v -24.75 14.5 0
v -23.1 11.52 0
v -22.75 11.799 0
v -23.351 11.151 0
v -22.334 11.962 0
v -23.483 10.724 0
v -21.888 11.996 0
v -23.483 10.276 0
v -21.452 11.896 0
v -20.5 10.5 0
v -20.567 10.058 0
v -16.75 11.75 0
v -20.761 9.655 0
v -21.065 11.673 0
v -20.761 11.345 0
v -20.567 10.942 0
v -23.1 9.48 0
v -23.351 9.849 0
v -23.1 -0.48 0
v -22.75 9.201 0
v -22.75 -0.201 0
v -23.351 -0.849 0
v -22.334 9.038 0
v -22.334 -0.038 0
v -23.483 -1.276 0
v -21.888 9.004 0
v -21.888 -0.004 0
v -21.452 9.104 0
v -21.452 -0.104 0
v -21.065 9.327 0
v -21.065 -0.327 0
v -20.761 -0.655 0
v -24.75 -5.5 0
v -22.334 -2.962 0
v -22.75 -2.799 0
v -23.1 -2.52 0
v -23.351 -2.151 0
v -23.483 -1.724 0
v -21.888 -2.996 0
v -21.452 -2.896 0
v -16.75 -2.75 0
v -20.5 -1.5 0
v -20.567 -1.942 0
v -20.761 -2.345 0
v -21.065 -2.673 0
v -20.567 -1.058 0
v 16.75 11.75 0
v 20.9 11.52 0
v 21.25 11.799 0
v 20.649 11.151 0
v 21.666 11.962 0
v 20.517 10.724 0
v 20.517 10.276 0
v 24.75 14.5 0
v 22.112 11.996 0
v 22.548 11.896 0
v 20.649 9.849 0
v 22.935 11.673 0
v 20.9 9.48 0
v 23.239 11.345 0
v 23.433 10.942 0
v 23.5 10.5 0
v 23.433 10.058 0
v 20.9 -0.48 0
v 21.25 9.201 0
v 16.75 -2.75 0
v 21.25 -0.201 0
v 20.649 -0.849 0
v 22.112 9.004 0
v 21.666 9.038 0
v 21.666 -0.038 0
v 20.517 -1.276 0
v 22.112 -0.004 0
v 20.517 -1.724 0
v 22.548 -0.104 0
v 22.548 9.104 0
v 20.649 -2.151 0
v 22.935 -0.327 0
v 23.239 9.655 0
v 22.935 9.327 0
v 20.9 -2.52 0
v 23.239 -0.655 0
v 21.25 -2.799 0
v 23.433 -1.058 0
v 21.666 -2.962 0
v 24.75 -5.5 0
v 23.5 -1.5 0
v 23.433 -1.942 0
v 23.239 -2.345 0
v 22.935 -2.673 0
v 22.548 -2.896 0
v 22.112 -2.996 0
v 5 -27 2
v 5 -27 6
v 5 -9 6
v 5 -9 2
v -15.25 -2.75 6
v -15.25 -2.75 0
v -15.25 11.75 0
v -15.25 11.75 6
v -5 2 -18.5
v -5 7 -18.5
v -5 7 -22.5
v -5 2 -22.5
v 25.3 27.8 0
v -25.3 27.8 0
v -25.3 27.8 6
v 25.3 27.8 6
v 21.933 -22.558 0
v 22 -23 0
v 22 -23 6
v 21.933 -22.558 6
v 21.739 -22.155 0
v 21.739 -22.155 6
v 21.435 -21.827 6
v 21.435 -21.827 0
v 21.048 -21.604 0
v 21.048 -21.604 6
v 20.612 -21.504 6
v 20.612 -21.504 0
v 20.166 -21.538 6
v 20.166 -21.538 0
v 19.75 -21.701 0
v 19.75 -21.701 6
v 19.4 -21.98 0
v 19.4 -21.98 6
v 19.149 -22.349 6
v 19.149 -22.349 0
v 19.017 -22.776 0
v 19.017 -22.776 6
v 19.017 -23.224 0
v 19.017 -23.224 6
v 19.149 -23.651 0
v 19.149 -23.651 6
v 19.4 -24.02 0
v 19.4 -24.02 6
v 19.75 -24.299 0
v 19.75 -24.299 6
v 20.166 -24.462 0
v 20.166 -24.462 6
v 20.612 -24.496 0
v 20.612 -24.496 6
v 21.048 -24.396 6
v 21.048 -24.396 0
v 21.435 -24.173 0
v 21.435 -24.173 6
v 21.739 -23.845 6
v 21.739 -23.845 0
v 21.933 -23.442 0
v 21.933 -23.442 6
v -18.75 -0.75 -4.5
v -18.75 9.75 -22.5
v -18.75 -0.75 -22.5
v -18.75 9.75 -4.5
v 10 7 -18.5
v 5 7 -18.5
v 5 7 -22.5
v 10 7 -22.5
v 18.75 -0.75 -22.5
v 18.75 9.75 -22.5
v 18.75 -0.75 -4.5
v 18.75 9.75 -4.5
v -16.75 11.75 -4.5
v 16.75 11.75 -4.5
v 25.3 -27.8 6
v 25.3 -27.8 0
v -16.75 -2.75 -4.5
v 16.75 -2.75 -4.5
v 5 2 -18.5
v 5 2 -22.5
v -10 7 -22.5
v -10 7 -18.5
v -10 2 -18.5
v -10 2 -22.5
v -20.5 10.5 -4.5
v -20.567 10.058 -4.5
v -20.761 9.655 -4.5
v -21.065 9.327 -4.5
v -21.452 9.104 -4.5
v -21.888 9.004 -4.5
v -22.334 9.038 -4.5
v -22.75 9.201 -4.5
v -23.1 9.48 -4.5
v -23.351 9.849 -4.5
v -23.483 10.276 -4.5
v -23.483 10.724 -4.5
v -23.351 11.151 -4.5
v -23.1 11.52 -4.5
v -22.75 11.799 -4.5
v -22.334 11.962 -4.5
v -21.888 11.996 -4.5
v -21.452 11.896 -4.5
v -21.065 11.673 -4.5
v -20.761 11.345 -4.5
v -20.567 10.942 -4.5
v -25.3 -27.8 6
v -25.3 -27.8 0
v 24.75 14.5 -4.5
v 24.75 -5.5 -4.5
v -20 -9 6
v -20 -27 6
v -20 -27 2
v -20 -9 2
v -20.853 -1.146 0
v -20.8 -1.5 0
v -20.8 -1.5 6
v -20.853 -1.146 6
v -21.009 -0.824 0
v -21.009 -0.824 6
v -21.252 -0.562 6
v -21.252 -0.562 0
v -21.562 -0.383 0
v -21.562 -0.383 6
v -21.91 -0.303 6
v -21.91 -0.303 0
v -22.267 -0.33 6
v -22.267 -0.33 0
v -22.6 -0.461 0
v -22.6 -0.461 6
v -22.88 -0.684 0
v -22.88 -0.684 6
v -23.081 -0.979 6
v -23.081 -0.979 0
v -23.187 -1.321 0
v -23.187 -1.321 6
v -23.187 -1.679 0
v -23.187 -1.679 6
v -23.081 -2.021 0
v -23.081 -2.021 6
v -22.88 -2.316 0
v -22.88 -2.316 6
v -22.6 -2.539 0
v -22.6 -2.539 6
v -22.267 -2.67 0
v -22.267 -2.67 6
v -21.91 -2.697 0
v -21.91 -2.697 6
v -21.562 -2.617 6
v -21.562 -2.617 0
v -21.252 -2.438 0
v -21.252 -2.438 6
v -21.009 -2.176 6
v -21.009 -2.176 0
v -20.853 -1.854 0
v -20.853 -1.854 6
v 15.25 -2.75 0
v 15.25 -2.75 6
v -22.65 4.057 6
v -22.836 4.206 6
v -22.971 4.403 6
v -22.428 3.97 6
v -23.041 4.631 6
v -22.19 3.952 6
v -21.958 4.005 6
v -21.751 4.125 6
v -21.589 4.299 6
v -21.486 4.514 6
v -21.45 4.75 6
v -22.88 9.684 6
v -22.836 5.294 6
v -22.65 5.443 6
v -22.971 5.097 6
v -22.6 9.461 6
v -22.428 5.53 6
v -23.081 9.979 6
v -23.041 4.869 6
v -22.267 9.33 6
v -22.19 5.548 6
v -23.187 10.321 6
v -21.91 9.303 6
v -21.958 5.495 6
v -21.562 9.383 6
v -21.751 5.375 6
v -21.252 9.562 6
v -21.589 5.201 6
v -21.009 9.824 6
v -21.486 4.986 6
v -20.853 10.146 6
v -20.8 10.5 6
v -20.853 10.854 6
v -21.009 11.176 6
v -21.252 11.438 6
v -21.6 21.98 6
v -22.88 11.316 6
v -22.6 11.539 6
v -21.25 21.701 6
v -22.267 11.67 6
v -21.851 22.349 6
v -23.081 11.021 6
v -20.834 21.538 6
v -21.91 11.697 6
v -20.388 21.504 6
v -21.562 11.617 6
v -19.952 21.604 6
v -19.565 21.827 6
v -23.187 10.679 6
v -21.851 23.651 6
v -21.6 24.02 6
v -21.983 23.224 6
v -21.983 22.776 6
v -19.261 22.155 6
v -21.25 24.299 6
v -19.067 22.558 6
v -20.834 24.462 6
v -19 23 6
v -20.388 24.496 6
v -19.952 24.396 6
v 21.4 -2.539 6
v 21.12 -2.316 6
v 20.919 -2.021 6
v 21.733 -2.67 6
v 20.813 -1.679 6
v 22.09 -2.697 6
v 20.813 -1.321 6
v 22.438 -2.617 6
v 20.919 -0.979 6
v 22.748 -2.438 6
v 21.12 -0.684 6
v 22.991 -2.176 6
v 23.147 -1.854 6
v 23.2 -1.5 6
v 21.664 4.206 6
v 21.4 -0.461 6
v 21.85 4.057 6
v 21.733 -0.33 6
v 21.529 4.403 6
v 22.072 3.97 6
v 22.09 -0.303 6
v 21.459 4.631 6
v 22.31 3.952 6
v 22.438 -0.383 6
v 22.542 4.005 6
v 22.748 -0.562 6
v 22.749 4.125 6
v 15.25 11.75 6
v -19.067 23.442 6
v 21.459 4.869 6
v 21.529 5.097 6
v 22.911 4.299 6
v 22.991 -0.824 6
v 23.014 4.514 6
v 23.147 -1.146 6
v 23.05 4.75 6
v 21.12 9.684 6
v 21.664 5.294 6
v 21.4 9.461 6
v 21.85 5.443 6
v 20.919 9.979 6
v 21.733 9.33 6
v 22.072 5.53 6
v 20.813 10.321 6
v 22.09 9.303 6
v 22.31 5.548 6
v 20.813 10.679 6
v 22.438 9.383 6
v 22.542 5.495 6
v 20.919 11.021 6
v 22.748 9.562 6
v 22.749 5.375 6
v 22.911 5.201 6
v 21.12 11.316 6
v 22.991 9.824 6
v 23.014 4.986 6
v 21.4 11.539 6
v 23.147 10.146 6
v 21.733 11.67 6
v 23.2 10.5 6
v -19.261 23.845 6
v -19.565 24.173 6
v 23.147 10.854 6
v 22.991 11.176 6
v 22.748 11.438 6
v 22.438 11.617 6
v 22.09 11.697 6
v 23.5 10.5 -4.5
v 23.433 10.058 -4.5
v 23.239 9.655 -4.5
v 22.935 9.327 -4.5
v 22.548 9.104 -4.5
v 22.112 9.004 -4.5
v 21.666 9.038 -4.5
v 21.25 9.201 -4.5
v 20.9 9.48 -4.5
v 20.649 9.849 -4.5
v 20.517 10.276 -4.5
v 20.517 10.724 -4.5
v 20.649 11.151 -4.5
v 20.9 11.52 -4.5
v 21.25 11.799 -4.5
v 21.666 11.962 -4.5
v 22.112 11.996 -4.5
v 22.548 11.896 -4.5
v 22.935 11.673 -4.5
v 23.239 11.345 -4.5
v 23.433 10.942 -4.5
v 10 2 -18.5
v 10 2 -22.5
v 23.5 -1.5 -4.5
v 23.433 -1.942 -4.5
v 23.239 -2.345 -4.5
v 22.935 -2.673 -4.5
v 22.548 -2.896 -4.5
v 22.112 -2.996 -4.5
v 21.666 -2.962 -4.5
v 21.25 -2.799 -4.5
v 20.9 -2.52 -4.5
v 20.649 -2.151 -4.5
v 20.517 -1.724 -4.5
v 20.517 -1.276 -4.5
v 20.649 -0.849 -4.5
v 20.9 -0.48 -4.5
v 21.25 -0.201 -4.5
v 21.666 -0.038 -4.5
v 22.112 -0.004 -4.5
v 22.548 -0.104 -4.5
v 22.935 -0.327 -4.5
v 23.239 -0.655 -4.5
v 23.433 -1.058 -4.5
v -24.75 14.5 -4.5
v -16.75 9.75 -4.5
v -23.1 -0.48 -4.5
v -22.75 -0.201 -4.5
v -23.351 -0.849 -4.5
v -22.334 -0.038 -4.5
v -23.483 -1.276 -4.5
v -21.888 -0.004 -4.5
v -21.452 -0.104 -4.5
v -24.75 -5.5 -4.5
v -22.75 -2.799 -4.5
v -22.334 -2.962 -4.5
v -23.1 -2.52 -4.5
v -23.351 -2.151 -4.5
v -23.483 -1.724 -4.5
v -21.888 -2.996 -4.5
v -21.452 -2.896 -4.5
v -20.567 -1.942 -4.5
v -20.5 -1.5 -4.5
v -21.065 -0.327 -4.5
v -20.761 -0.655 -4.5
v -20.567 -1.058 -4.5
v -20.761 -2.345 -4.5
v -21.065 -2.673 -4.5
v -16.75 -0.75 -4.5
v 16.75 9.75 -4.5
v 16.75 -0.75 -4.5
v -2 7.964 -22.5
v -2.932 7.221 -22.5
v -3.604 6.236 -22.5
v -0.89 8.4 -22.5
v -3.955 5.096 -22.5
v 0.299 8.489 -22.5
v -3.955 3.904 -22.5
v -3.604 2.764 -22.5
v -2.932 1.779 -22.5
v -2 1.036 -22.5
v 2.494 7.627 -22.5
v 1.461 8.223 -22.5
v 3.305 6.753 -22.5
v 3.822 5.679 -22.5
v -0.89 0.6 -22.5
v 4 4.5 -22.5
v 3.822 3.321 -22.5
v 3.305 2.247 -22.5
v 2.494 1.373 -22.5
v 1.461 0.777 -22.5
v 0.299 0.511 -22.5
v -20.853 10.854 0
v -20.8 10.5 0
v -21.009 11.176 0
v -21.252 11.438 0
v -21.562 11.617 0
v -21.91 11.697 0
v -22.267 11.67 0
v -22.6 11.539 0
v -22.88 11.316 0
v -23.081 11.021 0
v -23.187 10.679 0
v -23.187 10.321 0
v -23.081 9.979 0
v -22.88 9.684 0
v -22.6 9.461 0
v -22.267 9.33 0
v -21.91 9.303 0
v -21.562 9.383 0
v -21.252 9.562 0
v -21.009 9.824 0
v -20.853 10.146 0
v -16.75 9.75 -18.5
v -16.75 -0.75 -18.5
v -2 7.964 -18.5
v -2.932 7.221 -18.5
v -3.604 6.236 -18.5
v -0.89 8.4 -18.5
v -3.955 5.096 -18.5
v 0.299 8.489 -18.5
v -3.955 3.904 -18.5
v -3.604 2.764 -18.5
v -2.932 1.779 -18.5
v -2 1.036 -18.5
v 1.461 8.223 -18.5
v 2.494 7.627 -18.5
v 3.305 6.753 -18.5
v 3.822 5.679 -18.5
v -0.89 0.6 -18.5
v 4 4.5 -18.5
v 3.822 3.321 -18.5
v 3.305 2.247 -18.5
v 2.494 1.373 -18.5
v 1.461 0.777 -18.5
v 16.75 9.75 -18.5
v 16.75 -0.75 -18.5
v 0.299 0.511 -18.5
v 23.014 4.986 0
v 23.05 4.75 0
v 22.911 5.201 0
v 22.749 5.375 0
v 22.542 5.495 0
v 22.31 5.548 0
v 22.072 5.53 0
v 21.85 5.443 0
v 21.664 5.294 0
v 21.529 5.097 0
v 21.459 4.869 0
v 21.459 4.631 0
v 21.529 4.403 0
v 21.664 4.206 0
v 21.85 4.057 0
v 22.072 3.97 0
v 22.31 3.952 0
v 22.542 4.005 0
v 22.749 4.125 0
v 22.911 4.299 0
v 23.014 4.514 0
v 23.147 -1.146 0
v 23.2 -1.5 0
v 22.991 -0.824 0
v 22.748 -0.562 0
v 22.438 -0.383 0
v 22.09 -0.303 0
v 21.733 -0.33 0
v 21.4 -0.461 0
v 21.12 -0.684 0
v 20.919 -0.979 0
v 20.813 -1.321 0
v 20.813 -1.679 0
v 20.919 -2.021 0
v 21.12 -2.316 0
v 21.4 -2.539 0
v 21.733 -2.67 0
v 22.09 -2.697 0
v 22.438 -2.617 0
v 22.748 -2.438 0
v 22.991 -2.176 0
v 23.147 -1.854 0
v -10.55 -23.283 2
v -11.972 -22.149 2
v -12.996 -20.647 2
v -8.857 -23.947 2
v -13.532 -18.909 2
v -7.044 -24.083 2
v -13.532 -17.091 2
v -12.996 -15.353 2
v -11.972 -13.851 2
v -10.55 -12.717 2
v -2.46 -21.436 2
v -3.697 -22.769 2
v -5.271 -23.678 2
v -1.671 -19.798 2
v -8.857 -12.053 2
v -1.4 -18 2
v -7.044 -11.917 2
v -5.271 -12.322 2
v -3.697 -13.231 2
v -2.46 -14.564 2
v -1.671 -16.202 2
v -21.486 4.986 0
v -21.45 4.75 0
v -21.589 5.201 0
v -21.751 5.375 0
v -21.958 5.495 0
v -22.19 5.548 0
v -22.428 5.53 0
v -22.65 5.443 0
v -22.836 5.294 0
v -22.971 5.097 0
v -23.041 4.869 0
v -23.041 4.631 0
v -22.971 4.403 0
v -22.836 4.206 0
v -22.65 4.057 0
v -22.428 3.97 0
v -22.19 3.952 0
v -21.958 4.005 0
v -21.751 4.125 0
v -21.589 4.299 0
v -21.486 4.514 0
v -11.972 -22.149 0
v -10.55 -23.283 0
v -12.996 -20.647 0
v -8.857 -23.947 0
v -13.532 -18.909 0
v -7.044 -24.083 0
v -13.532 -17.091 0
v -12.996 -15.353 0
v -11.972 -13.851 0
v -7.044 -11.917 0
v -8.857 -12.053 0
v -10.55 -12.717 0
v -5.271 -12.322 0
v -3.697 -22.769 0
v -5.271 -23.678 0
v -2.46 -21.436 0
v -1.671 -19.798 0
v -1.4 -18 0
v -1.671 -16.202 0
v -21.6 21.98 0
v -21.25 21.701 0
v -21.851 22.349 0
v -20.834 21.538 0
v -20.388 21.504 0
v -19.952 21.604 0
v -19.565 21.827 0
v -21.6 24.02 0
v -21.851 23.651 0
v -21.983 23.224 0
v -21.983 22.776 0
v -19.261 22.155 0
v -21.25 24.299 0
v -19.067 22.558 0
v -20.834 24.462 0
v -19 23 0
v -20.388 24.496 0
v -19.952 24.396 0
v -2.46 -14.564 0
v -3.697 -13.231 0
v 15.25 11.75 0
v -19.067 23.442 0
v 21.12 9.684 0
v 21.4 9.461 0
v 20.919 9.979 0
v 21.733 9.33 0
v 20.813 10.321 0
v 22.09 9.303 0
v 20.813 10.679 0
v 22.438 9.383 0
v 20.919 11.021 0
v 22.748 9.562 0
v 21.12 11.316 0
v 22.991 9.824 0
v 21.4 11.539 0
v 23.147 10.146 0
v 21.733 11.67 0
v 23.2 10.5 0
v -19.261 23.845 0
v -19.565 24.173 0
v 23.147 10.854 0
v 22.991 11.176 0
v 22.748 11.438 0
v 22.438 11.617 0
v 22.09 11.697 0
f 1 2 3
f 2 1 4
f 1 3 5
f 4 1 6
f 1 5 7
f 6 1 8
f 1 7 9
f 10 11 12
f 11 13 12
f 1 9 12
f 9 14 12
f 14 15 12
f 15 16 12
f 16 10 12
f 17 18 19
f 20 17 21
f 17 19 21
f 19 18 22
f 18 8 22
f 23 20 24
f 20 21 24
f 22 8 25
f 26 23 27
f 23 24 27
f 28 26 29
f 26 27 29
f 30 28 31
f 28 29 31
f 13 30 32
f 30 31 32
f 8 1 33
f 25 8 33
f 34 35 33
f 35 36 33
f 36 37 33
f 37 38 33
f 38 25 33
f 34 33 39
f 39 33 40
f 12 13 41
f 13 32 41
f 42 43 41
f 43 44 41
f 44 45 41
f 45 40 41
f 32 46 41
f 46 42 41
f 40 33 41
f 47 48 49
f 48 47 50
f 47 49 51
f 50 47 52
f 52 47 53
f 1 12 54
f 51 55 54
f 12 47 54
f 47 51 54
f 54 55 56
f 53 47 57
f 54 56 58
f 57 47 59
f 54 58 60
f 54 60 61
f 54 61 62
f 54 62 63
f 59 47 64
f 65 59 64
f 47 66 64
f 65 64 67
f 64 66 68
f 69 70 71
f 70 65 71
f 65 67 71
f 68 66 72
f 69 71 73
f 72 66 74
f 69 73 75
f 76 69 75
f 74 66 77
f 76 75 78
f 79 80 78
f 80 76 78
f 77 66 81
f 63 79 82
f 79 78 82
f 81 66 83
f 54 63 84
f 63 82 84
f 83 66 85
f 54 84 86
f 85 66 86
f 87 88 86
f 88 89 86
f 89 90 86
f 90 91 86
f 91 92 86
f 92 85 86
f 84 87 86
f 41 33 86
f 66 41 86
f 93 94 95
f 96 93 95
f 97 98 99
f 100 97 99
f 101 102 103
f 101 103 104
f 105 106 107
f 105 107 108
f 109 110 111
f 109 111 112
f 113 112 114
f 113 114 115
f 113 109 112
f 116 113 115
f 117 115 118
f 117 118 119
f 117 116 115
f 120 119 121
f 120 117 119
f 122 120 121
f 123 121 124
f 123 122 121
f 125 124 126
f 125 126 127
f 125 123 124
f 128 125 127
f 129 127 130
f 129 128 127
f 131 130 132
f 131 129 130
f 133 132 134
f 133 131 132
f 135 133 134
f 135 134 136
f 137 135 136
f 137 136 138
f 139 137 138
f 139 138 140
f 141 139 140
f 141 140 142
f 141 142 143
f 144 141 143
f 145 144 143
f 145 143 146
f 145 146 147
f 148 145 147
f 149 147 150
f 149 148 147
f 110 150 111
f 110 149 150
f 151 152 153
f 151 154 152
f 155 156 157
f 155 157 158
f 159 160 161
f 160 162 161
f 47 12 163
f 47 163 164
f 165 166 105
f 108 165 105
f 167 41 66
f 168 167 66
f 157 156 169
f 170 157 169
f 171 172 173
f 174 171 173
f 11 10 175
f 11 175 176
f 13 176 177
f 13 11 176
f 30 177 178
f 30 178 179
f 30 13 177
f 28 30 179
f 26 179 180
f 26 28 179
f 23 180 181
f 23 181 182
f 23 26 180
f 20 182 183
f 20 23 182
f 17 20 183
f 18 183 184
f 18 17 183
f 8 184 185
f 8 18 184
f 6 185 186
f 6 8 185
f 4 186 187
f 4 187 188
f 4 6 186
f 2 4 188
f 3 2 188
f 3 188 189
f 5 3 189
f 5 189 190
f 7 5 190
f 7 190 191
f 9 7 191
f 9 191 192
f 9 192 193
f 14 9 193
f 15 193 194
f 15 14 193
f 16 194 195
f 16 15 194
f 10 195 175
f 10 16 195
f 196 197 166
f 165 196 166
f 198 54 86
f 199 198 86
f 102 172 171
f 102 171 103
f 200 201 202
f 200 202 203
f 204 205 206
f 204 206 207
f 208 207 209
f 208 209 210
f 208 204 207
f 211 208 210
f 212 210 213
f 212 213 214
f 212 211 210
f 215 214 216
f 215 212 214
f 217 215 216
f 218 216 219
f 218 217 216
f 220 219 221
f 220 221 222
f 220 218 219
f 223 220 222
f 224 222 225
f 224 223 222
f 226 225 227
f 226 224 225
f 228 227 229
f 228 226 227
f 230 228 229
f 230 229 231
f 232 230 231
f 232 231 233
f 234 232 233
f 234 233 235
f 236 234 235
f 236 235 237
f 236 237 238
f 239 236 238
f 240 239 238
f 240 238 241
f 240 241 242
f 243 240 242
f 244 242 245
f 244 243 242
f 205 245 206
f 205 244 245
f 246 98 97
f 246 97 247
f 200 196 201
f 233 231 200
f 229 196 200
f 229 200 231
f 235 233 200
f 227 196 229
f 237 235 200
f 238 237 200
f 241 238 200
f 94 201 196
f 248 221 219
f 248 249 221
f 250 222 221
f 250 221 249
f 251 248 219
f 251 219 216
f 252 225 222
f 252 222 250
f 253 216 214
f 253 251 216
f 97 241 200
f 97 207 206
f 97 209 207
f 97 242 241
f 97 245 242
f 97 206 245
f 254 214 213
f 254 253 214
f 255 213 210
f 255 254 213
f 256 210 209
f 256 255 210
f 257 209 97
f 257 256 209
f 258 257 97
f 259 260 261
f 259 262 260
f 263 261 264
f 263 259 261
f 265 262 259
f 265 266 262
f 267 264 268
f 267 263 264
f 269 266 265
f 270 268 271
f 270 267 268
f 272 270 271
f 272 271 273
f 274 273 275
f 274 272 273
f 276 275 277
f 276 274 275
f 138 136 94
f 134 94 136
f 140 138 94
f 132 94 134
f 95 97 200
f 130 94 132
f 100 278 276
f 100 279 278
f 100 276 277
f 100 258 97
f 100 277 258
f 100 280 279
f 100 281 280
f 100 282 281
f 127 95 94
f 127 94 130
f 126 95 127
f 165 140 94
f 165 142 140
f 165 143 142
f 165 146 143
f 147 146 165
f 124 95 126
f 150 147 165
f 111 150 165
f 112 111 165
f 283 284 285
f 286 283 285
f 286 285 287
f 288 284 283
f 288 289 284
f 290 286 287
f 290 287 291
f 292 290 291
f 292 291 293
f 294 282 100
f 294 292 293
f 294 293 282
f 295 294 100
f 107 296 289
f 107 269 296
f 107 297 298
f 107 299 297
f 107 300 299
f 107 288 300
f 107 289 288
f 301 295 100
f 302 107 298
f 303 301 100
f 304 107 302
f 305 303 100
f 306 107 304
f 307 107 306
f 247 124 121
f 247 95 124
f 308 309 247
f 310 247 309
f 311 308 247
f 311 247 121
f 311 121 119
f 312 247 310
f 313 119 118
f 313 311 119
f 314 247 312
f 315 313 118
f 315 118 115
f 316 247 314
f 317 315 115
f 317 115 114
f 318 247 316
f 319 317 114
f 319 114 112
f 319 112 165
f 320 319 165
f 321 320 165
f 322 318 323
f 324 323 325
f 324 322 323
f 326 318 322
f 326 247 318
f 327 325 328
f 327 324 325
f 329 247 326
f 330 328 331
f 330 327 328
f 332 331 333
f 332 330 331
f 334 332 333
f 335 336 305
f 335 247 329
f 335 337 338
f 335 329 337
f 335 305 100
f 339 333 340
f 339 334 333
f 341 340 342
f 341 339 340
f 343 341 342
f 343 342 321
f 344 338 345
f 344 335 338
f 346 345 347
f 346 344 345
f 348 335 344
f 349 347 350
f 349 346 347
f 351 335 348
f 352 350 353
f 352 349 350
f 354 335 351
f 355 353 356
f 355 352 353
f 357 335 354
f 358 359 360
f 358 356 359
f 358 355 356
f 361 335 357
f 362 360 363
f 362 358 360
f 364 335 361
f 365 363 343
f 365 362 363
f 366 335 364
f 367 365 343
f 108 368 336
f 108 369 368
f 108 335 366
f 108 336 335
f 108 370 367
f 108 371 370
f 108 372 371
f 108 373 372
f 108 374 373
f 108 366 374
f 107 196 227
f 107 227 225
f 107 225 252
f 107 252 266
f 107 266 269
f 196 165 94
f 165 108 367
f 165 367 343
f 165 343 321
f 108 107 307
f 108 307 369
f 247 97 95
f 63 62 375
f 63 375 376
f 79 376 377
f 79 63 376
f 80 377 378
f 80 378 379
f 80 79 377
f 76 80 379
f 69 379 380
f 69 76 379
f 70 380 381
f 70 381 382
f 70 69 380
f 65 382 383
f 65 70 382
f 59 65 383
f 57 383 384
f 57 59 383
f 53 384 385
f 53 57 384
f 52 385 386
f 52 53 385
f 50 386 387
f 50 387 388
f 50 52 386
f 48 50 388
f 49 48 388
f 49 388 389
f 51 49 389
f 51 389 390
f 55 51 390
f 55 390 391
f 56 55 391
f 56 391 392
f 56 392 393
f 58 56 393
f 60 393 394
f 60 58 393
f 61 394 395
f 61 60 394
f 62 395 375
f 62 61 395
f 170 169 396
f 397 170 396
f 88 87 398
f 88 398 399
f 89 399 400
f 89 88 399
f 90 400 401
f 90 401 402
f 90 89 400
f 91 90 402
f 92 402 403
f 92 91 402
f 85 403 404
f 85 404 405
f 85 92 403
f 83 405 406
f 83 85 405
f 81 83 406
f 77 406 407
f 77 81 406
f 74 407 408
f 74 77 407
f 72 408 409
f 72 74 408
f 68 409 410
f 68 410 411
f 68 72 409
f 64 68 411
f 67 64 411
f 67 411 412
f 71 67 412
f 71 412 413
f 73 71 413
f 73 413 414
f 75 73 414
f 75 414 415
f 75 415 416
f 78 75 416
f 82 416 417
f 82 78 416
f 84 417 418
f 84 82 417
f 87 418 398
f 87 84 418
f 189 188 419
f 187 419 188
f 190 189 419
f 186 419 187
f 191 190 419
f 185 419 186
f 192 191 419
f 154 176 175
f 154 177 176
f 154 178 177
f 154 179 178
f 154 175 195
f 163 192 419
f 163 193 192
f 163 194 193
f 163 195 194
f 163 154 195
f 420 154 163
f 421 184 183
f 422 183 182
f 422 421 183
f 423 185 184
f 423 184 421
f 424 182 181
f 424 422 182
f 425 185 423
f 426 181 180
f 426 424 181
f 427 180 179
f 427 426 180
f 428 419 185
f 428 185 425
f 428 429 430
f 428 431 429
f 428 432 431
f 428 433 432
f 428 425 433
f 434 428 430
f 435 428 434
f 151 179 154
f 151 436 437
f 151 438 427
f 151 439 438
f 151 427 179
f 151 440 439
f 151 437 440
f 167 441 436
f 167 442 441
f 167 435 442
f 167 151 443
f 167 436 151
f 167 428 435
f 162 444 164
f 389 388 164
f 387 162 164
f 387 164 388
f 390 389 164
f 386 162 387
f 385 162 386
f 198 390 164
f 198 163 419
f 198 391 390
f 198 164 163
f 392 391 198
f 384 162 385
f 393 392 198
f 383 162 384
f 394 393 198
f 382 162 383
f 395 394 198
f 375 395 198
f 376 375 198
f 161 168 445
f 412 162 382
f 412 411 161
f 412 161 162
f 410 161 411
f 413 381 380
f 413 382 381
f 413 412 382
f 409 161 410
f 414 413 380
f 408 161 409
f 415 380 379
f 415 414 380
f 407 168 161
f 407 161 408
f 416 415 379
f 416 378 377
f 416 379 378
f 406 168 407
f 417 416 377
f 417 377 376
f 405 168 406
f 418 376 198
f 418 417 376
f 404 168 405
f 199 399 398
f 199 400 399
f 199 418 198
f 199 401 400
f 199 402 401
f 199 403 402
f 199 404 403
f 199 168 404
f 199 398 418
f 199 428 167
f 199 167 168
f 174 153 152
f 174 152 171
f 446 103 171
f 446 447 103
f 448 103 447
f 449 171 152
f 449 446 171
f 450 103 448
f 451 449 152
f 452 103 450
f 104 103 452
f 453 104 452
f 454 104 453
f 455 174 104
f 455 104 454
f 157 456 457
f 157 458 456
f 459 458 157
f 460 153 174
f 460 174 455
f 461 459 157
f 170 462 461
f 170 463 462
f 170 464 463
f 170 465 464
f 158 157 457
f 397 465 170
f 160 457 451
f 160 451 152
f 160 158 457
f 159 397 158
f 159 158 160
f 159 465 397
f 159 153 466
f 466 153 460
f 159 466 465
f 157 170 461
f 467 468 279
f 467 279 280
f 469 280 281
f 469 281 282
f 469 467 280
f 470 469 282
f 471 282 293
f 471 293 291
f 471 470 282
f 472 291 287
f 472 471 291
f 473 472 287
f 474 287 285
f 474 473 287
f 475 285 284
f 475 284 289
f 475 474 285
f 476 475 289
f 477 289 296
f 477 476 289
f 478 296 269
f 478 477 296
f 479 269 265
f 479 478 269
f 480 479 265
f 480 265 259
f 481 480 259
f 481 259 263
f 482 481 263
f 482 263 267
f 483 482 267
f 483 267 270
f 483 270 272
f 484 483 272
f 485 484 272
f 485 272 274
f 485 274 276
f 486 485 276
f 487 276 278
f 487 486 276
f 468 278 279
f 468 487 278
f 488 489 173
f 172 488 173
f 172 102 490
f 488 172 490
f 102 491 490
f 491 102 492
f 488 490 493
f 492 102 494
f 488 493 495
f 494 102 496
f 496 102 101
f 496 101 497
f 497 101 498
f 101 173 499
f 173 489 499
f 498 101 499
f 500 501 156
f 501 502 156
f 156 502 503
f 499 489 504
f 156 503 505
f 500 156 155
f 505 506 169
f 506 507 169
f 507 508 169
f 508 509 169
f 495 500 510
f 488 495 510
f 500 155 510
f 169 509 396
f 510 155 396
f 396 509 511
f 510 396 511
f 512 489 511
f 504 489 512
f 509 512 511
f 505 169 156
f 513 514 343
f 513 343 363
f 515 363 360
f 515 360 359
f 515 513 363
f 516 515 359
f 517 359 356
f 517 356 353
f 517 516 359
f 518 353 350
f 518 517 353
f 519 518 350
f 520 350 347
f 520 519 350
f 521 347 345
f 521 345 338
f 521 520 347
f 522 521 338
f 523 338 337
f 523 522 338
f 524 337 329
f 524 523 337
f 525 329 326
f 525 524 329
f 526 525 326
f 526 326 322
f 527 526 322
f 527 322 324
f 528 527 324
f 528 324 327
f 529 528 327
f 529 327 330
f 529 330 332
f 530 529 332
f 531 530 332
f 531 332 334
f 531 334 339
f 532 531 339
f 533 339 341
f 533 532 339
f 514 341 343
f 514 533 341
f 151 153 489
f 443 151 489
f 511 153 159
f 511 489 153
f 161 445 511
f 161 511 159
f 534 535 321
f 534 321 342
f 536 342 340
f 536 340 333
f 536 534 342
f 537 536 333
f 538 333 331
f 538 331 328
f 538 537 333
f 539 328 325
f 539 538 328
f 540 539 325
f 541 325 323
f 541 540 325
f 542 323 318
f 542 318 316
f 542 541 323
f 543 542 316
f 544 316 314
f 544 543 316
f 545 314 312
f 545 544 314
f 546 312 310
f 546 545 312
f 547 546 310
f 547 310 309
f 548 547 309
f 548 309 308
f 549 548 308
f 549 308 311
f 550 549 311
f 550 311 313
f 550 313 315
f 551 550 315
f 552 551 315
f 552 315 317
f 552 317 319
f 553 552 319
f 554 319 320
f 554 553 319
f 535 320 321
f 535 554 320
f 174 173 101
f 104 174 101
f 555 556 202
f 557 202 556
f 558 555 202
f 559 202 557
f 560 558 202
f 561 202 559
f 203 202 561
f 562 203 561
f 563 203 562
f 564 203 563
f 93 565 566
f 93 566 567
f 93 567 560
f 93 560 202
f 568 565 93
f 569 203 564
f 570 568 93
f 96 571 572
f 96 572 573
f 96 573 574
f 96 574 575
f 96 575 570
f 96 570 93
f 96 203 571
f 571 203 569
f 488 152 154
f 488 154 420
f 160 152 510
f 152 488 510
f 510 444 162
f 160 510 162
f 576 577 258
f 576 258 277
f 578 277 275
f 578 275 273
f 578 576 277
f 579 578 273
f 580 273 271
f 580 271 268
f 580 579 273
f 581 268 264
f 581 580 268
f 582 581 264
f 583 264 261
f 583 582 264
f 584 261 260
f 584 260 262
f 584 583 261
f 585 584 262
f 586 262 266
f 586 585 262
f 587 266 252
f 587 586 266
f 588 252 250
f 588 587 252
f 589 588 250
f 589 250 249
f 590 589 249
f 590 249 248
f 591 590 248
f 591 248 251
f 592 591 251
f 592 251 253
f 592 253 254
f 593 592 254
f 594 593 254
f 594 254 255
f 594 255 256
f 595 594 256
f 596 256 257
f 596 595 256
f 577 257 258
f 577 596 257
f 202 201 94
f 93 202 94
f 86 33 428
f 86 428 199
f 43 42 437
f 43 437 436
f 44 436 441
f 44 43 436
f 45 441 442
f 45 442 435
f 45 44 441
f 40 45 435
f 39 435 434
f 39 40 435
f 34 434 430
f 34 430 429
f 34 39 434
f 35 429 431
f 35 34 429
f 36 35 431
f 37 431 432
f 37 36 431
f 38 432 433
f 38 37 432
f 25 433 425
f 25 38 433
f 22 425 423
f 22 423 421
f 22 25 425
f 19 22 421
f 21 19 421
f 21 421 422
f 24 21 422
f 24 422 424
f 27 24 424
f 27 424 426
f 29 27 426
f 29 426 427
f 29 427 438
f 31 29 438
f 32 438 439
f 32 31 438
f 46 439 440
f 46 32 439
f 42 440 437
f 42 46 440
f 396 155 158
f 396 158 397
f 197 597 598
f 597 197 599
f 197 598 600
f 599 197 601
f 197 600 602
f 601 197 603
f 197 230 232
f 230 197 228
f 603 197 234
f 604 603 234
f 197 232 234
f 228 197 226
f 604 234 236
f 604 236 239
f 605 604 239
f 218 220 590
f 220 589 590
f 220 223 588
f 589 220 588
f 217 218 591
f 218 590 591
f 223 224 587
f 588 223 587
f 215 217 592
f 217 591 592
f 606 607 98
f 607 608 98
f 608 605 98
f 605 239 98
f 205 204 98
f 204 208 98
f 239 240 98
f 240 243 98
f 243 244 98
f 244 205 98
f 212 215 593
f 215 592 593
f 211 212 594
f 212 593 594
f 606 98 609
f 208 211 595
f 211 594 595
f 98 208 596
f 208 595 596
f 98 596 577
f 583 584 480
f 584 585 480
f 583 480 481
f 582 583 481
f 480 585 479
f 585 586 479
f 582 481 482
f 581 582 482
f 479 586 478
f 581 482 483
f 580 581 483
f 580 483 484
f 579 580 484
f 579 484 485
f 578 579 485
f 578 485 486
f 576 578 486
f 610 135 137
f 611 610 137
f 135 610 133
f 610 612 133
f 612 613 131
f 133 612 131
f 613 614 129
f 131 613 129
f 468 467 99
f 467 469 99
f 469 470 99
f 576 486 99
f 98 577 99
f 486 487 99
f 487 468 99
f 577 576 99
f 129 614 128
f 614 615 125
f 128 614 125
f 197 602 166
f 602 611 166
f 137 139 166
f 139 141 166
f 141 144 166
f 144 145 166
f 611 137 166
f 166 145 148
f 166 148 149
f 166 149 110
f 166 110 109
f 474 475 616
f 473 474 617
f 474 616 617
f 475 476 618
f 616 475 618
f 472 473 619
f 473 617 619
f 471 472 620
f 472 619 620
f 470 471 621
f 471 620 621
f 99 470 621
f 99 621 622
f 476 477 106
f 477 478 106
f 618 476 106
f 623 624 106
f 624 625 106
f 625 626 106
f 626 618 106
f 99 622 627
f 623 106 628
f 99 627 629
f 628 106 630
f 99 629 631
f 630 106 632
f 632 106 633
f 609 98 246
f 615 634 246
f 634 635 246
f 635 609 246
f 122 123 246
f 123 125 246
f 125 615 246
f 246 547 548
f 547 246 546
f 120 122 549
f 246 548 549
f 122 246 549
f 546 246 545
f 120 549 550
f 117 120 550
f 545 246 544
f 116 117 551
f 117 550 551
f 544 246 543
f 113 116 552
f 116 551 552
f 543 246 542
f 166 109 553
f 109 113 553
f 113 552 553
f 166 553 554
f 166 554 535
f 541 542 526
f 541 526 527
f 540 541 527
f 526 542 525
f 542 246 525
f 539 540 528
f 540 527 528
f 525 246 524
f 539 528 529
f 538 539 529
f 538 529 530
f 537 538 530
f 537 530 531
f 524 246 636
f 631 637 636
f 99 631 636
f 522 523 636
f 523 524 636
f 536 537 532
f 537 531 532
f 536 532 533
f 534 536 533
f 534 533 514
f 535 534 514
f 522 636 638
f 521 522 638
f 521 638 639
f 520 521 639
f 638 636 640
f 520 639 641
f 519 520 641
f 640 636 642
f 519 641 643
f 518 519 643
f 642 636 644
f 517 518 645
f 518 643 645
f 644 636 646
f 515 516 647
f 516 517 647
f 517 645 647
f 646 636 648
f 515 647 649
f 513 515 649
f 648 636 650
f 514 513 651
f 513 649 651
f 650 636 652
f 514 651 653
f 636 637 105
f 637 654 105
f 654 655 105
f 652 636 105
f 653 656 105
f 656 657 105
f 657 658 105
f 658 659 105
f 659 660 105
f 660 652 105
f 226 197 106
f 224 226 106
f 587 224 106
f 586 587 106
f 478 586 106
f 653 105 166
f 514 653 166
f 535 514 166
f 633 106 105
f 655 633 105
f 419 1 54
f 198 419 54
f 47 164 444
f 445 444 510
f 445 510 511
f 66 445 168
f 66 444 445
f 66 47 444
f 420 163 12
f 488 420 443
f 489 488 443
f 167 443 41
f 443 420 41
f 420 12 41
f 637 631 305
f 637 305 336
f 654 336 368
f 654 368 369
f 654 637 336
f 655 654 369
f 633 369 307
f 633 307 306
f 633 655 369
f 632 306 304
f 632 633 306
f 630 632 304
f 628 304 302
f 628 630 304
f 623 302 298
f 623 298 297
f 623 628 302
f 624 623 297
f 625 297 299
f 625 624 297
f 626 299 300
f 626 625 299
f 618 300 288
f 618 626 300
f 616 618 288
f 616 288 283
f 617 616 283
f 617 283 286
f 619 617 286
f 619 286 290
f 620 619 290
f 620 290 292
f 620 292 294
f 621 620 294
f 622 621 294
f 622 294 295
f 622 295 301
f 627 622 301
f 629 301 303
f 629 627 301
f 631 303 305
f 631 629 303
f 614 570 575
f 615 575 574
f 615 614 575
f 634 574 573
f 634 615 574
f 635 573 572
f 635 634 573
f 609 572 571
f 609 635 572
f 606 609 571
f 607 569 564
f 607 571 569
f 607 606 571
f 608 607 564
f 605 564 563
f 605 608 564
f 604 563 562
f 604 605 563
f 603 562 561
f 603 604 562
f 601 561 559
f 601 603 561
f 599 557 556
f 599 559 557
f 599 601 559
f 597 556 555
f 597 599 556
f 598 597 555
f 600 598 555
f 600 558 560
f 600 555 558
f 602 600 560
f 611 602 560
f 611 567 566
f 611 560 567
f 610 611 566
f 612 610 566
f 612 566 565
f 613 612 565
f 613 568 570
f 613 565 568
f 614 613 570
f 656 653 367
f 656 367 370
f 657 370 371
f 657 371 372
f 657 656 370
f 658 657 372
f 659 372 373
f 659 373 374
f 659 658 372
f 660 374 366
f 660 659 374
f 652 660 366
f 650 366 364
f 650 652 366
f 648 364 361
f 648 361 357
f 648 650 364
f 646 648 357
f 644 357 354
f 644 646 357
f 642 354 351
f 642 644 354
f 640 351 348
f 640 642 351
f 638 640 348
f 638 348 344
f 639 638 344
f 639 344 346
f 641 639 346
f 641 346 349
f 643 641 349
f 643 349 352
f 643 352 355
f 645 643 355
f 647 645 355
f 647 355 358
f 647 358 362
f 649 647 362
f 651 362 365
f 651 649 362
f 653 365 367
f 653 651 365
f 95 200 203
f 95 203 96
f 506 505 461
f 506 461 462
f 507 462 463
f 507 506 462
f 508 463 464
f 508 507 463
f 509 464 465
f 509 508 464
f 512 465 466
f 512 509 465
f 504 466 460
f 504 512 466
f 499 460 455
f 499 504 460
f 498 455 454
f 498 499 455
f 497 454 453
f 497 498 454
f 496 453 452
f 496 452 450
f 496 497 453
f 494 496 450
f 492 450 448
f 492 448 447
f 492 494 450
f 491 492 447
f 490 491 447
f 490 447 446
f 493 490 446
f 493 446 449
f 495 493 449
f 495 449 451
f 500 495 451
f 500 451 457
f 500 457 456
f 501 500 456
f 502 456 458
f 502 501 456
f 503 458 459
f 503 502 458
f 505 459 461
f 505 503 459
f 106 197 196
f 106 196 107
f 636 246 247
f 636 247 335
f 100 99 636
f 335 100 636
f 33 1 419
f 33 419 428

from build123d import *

# Parameters (mm, degrees)
F0_W     = 50.6
F0_H     = 55.6
F0_R     = 6.1
F0_R_2   = 1.2
F0_R_3   = 1.5
F0_R_4   = 0.8
F0_W_2   = 30.5
F0_H_2   = 14.5
F1_DEPTH = 6
F2_W     = 25
F2_H     = 18
F3_DEPTH = 4
F4_W     = 49.5
F4_H     = 20
F4_R     = 1.5
F4_W_2   = 33.5
F4_H_2   = 14.5
F5_DEPTH = 4.5
F6_W     = 2
F6_H     = 10.5
F7_DEPTH = 14
F8_W     = 37.5
F8_H     = 10.5
F8_W_2   = 5
F8_H_2   = 5
F8_R     = 4
F9_DEPTH = 4


with BuildPart() as f1:
    # F0 (on Top) → F1 (new body)
    with BuildSketch(Plane.XY):
        Rectangle(F0_W, F0_H)
        with Locations((-7.5, -18)):
            Circle(F0_R, mode=Mode.SUBTRACT)
        with Locations((-22, -1.5)):
            Circle(F0_R_2, mode=Mode.SUBTRACT)
        with Locations((20.5, -23)):
            Circle(F0_R_3, mode=Mode.SUBTRACT)
        with Locations((22, -1.5)):
            Circle(F0_R_2, mode=Mode.SUBTRACT)
        with Locations((-22.25, 4.75)):
            Circle(F0_R_4, mode=Mode.SUBTRACT)
        with Locations((-22, 10.5)):
            Circle(F0_R_2, mode=Mode.SUBTRACT)
        with Locations((-20.5, 23)):
            Circle(F0_R_3, mode=Mode.SUBTRACT)
        with Locations((0, 4.5)):
            Rectangle(F0_W_2, F0_H_2, mode=Mode.SUBTRACT)
        with Locations((22.25, 4.75)):
            Circle(F0_R_4, mode=Mode.SUBTRACT)
        with Locations((22, 10.5)):
            Circle(F0_R_2, mode=Mode.SUBTRACT)
    extrude(amount=F1_DEPTH)

    # F2 (on face) → F3 (cut)
    with BuildSketch(Plane.XY.offset(6)):
        with Locations((-7.5, -18)):
            Rectangle(F2_W, F2_H)
    extrude(amount=-F3_DEPTH, mode=Mode.SUBTRACT)


with BuildPart() as f5:
    # F4 (on face) → F5 (new body)
    with BuildSketch(Plane(origin=(0, 0, 0), x_dir=(1, 0, 0), z_dir=(0, 0, -1))):
        with Locations((0, -4.5)):
            Rectangle(F4_W, F4_H)
        with Locations((-22, -10.5)):
            Circle(F4_R, mode=Mode.SUBTRACT)
        with Locations((22, -10.5)):
            Circle(F4_R, mode=Mode.SUBTRACT)
        with Locations((-22, 1.5)):
            Circle(F4_R, mode=Mode.SUBTRACT)
        with Locations((0, -4.5)):
            Rectangle(F4_W_2, F4_H_2, mode=Mode.SUBTRACT)
        with Locations((22, 1.5)):
            Circle(F4_R, mode=Mode.SUBTRACT)
    extrude(amount=F5_DEPTH)

    # F6 (on face) → F7 (join)
    with BuildSketch(Plane(origin=(0, 0, -4.5), x_dir=(1, 0, 0), z_dir=(0, 0, -1))):
        with Locations((17.75, -4.5)):
            Rectangle(F6_W, F6_H)
        with Locations((-17.75, -4.5)):
            Rectangle(F6_W, F6_H)
    extrude(amount=F7_DEPTH)

    # F8 (on face) → F9 (join)
    with BuildSketch(Plane(origin=(0, 0, -18.5), x_dir=(1, 0, 0), z_dir=(0, 0, -1))):
        with Locations((0, -4.5)):
            Rectangle(F8_W, F8_H)
        with Locations((-7.5, -4.5)):
            Rectangle(F8_W_2, F8_H_2, mode=Mode.SUBTRACT)
        with Locations((0, -4.5)):
            Circle(F8_R, mode=Mode.SUBTRACT)
        with Locations((7.5, -4.5)):
            Rectangle(F8_W_2, F8_H_2, mode=Mode.SUBTRACT)
    extrude(amount=F9_DEPTH)


solid = Compound([f1.part, f5.part])
